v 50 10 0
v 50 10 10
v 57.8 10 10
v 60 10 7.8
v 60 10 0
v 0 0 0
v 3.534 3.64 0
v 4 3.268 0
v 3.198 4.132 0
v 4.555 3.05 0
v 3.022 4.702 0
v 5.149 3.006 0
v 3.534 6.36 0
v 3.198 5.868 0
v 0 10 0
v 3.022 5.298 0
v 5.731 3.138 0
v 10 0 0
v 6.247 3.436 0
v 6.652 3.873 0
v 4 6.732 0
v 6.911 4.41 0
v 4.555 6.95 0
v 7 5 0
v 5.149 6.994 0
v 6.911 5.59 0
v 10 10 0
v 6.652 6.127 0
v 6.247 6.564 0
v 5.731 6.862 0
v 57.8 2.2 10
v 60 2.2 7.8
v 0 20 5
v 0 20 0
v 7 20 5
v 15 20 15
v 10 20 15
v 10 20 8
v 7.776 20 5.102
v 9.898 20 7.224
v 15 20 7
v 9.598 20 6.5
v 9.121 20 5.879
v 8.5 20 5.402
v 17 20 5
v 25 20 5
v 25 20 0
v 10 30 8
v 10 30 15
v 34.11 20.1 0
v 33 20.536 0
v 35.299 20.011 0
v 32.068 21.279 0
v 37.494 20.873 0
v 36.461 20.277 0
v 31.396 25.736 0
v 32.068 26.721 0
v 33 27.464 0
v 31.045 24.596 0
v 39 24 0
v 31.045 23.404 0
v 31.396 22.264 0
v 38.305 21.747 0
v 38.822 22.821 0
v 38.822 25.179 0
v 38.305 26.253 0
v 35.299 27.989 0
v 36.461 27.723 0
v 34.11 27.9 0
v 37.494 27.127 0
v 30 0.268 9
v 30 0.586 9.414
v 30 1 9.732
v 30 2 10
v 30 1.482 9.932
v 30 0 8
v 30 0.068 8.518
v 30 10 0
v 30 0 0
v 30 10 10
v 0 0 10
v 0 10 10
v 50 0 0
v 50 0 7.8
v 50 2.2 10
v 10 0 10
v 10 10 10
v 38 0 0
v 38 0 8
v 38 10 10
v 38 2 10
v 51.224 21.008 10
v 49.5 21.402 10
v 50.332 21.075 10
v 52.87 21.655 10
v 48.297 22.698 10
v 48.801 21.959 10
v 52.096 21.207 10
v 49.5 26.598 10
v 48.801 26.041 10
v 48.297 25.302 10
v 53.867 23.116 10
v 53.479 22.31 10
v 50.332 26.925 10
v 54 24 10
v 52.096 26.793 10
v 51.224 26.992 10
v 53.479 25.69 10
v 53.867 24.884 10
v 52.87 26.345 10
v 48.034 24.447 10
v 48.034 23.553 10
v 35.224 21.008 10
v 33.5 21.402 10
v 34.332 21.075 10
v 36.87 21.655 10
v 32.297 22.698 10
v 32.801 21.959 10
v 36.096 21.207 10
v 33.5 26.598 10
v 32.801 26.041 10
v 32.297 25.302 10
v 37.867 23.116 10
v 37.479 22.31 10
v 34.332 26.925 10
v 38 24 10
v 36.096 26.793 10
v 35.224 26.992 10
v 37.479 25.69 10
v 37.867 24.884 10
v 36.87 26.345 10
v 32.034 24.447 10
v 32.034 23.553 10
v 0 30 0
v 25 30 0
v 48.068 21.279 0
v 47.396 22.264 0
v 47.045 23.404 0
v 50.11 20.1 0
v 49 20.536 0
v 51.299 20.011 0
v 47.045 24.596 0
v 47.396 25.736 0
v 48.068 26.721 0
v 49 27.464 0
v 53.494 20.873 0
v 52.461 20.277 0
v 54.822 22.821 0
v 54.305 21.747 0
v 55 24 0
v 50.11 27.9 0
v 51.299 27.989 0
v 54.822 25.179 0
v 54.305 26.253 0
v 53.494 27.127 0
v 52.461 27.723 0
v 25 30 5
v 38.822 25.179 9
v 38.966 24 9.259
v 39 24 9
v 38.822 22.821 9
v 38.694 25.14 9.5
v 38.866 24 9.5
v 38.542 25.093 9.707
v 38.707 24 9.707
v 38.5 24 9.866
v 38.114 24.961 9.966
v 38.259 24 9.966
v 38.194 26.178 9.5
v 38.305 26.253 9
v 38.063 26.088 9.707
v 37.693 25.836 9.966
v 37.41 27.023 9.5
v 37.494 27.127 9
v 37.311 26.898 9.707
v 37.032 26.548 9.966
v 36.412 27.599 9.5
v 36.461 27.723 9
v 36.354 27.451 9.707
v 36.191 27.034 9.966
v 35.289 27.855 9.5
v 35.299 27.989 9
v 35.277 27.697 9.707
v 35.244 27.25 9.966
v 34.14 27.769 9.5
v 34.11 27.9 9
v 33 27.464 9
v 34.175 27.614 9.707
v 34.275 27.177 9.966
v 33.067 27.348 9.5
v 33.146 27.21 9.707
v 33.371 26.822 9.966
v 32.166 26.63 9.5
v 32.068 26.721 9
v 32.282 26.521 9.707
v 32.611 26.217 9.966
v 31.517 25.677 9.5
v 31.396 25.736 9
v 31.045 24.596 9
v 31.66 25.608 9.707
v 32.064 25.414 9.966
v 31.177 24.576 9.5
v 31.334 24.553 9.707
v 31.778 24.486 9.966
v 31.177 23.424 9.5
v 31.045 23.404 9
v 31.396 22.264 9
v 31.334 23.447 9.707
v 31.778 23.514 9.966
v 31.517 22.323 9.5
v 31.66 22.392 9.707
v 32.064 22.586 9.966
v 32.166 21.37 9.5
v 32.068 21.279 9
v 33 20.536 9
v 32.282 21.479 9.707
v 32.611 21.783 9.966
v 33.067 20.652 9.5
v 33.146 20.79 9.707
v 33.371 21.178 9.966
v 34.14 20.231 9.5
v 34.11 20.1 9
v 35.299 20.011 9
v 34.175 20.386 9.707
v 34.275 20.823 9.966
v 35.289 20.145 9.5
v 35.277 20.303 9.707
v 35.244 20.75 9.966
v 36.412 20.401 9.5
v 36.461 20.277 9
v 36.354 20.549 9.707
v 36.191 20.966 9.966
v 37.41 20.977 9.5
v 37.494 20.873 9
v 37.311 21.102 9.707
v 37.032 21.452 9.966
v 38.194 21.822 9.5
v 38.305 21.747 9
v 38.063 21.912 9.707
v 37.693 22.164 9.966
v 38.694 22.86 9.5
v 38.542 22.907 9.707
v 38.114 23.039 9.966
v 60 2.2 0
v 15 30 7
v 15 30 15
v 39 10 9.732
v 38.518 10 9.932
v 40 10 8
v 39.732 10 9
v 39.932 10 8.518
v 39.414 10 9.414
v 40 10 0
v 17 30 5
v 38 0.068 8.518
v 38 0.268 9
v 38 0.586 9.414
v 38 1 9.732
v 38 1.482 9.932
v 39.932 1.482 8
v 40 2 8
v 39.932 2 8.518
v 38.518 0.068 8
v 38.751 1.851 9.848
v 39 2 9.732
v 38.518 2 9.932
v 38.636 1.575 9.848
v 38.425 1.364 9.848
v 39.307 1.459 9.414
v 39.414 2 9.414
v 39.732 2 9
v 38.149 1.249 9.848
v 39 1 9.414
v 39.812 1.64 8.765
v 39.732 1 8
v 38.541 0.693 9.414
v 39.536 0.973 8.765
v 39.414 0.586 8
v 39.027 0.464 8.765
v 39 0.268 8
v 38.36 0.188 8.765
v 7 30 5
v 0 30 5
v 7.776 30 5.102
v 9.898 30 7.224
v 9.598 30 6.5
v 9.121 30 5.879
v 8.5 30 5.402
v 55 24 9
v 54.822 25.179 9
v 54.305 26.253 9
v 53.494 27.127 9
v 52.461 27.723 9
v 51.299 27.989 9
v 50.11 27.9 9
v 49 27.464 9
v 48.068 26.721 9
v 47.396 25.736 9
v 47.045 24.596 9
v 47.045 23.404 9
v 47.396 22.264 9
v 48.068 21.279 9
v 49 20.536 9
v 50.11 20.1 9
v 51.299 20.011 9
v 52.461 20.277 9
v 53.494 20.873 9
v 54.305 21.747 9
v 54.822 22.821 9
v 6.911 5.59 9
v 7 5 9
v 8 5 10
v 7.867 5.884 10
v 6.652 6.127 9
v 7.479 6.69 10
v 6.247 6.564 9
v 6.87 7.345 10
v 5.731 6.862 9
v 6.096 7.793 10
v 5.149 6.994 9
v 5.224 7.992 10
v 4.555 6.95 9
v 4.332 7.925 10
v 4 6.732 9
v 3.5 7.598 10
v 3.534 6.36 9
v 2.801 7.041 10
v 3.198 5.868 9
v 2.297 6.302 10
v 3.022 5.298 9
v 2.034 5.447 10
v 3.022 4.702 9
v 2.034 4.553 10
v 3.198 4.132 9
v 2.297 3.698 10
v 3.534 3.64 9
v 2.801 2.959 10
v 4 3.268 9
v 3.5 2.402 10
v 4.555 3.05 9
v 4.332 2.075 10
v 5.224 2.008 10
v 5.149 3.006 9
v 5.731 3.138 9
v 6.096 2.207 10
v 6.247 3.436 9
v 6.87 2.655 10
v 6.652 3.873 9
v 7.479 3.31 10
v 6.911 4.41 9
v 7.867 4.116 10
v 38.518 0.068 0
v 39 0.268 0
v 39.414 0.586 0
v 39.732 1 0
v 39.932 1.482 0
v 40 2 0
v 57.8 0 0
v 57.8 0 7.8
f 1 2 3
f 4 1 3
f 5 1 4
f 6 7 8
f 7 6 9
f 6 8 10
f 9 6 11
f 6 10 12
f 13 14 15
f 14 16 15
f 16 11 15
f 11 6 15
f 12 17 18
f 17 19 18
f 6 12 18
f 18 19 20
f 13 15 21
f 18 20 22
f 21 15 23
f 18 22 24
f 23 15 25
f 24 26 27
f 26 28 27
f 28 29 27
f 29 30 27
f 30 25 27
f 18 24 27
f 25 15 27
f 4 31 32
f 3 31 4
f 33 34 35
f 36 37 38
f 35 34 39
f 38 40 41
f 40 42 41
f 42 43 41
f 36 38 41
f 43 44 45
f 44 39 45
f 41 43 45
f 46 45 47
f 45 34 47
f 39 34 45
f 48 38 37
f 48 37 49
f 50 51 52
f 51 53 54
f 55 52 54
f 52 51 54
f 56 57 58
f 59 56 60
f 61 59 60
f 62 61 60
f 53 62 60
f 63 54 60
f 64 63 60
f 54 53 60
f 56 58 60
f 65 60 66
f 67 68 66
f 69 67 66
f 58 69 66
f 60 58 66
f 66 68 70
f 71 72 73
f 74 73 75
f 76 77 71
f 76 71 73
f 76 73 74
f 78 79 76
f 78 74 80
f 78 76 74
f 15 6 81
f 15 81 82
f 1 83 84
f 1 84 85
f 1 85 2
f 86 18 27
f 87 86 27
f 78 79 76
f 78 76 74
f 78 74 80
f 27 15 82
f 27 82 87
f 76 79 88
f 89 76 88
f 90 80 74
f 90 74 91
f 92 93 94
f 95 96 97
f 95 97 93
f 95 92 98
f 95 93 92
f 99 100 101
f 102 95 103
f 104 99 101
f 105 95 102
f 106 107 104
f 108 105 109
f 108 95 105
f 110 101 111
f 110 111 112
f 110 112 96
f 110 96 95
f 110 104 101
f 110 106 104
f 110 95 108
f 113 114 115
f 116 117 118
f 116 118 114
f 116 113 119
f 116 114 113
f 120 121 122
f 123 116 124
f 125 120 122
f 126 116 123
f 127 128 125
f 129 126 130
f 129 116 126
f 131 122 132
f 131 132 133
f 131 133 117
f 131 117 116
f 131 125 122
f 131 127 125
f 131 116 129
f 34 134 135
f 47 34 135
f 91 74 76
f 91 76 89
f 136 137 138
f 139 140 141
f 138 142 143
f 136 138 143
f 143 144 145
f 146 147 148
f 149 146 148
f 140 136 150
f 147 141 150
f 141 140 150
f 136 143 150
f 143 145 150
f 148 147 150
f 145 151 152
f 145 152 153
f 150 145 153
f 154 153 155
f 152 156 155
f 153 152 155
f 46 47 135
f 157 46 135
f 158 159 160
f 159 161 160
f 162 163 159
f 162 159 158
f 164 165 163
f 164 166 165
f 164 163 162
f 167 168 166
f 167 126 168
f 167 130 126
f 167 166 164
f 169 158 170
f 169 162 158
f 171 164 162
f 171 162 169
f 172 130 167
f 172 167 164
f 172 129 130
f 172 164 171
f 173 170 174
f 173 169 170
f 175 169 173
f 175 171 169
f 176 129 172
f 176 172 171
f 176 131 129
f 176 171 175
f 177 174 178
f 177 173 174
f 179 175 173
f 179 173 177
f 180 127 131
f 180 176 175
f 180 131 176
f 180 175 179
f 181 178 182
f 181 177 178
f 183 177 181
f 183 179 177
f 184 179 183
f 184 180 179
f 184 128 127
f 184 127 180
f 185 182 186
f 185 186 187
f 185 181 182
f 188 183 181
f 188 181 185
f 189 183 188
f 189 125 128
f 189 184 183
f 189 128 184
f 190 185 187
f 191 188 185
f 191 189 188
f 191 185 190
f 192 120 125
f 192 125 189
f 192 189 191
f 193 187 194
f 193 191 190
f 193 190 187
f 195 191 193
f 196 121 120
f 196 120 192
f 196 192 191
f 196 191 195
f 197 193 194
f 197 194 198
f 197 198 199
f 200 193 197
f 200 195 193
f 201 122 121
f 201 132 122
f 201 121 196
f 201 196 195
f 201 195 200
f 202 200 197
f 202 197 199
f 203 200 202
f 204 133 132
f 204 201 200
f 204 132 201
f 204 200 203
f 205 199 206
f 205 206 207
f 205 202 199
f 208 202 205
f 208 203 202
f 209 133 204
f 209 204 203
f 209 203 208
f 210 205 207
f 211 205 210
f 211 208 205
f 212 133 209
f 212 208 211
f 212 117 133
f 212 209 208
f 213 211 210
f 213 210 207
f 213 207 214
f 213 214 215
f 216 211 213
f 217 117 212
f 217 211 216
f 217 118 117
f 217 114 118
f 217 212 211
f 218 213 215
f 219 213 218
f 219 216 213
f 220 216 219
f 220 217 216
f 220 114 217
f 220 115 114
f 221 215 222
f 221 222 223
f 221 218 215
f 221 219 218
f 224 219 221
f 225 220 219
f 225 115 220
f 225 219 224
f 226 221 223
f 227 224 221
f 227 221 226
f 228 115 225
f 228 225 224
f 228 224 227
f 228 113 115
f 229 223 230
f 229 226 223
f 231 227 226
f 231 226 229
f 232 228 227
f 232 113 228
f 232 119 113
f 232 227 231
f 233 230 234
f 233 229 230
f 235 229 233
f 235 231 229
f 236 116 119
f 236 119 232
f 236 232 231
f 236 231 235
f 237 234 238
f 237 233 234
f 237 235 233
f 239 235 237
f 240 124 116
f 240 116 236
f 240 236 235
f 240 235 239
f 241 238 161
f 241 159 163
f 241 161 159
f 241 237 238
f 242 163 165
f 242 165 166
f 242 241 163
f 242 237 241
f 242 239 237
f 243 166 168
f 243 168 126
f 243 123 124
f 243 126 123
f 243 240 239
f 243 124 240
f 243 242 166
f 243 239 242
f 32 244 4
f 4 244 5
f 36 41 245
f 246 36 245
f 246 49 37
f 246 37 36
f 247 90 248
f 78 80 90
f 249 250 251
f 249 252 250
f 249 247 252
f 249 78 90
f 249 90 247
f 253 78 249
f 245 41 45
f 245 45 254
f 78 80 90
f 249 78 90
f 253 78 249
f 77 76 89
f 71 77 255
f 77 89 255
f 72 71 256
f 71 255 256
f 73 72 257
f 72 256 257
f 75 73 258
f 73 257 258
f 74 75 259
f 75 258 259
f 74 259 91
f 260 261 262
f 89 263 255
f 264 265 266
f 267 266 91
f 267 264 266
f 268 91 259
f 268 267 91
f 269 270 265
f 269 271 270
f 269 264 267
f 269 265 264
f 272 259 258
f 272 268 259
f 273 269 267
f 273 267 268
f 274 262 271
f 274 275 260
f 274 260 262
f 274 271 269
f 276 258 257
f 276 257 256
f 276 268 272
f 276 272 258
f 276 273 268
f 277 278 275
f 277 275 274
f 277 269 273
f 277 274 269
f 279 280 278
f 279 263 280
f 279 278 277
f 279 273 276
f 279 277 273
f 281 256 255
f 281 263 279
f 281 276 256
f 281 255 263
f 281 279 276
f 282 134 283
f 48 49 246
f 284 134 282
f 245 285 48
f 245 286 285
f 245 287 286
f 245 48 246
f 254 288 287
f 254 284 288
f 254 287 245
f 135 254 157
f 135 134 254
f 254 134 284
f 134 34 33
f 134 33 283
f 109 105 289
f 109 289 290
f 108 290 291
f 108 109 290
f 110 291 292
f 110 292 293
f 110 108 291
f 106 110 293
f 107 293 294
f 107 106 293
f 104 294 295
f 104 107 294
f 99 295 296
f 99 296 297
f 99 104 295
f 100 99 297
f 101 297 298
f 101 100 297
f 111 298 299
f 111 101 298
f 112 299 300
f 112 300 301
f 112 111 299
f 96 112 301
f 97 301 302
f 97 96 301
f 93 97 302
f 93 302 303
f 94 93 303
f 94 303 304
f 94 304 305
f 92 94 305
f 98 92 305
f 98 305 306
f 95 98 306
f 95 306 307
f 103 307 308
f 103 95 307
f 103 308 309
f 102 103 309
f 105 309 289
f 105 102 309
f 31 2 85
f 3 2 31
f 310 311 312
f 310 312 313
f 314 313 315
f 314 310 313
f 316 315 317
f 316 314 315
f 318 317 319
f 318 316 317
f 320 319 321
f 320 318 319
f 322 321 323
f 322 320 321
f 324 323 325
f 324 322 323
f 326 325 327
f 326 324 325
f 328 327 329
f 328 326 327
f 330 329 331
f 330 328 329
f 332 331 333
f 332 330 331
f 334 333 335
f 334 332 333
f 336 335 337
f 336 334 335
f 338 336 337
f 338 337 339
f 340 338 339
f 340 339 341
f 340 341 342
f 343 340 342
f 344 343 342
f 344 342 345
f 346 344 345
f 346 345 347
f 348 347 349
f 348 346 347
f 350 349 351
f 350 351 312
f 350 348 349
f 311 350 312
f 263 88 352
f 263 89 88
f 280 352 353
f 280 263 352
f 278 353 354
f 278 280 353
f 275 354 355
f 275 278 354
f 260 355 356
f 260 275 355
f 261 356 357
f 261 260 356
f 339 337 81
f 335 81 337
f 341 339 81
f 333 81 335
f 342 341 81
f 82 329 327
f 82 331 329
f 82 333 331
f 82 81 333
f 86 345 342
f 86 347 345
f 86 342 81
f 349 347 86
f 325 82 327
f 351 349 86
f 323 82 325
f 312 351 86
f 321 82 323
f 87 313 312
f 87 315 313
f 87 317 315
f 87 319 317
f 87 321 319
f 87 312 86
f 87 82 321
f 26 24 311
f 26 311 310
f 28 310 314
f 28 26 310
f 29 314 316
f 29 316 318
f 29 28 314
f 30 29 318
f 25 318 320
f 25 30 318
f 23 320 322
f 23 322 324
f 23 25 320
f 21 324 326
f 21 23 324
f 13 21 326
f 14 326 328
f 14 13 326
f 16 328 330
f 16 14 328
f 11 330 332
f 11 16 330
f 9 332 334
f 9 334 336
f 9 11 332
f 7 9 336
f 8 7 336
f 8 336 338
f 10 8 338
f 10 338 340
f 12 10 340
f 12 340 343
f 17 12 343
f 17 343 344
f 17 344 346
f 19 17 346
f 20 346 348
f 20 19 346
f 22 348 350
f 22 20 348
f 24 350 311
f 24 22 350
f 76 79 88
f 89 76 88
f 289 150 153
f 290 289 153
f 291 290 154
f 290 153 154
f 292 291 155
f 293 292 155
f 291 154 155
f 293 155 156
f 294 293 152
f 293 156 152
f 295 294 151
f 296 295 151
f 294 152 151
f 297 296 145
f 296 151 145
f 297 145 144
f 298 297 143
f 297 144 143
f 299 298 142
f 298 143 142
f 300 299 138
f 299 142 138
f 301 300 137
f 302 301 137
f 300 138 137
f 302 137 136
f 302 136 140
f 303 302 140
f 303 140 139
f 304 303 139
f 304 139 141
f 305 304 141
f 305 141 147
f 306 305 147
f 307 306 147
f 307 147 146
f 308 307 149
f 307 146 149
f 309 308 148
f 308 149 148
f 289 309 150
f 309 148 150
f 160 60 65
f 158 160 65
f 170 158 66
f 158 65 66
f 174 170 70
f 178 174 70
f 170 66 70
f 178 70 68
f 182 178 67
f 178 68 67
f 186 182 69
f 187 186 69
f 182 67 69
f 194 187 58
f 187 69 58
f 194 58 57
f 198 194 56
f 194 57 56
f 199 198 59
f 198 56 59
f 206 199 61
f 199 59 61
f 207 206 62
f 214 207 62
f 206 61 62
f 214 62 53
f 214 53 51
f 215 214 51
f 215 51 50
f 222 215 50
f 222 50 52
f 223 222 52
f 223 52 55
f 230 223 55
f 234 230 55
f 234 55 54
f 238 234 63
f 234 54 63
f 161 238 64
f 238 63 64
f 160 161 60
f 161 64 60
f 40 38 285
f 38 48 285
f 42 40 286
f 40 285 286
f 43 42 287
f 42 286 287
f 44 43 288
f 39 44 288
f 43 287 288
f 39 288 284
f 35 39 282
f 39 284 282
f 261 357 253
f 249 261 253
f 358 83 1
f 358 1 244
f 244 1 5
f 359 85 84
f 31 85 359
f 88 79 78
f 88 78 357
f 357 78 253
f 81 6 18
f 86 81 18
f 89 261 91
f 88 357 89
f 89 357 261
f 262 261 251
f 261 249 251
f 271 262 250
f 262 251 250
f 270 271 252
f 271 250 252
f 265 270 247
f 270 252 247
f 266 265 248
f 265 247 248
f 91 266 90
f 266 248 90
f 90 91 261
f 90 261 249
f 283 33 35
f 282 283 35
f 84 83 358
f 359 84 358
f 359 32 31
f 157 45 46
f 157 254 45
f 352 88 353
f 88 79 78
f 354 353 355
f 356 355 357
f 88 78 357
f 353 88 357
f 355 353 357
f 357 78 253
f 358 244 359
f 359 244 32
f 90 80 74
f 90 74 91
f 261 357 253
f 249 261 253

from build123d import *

# Parameters (mm, degrees)
CYLINDER_R        = 2
CYLINDER_DEPTH    = 10
BOX_W             = 10
BOX_H             = 10
BOX_DEPTH         = 10
CHAMFER_SIZE      = 1
BOX001_W          = 10
BOX001_H          = 10
BOX001_DEPTH      = 10
CHAMFER001_SIZE   = 2
FILLET_R          = 2
BOX005_W          = 10
BOX005_H          = 10
BOX005_DEPTH      = 10
CHAMFER002_SIZE   = 2.2
CYLINDER002_R     = 4
CYLINDER002_DEPTH = 10
CHAMFER003_SIZE   = 1
CYLINDER001_R     = 4
CYLINDER001_DEPTH = 10
FILLET001_R       = 1
BOX004_W          = 10
BOX004_H          = 10
BOX004_DEPTH      = 10
BOX003_W          = 10
BOX003_H          = 10
BOX003_DEPTH      = 10
BOX002_W          = 25
BOX002_H          = 10
BOX002_DEPTH      = 15
CHAMFER004_SIZE   = 2
FILLET002_R       = 3


with BuildPart() as cylinder:
    # Cylinder → Cylinder (new body)
    with BuildSketch(Plane(origin=(5, 5, 0), x_dir=(1, 0, 0), z_dir=(0, 0, 1))):
        Circle(CYLINDER_R)
    extrude(amount=CYLINDER_DEPTH)


with BuildPart() as chamfer_body:
    # Box → Box (new body)
    with BuildSketch(Plane.XY):
        with Locations((5, 5)):
            Rectangle(BOX_W, BOX_H)
    extrude(amount=BOX_DEPTH)

    # Cut: cut Cylinder
    add(cylinder.part, mode=Mode.SUBTRACT)

    # Chamfer
    chamfer_edges = [chamfer_body.edges().sort_by_distance(p)[0] for p in [
        (3, 5, 10),
    ]]
    chamfer(chamfer_edges, length=CHAMFER_SIZE)


with BuildPart() as cube001:
    # Box001 → Box001 (new body)
    with BuildSketch(Plane(origin=(30, 0, 0), x_dir=(1, 0, 0), z_dir=(0, 0, 1))):
        with Locations((5, 5)):
            Rectangle(BOX001_W, BOX001_H)
    extrude(amount=BOX001_DEPTH)


with BuildPart() as chamfer001:
    # Chamfer001 base: copy of Cube001
    add(cube001.part)

    # Chamfer001
    chamfer001_edges = [chamfer001.edges().sort_by_distance(p)[0] for p in [
        (40, 0, 5),
        (40, 5, 10),
        (35, 0, 10),
    ]]
    chamfer(chamfer001_edges, length=CHAMFER001_SIZE)


with BuildPart() as fillet_body:
    # Fillet base: copy of Cube001
    add(cube001.part)

    # Fillet
    fillet_edges = [fillet_body.edges().sort_by_distance(p)[0] for p in [
        (40, 0, 5),
        (40, 5, 10),
        (35, 0, 10),
    ]]
    fillet(fillet_edges, radius=FILLET_R)


with BuildPart() as chamfer002:
    # Box005 → Box005 (new body)
    with BuildSketch(Plane(origin=(50, 0, 0), x_dir=(1, 0, 0), z_dir=(0, 0, 1))):
        with Locations((5, 5)):
            Rectangle(BOX005_W, BOX005_H)
    extrude(amount=BOX005_DEPTH)

    # Chamfer002
    chamfer002_edges = [chamfer002.edges().sort_by_distance(p)[0] for p in [
        (60, 0, 5),
        (60, 5, 10),
        (55, 0, 10),
    ]]
    chamfer(chamfer002_edges, length=CHAMFER002_SIZE)


with BuildPart() as chamfer003:
    # Cylinder002 → Cylinder002 (new body)
    with BuildSketch(Plane(origin=(51, 24, 0), x_dir=(1, 0, 0), z_dir=(0, 0, 1))):
        Circle(CYLINDER002_R)
    extrude(amount=CYLINDER002_DEPTH)

    # Chamfer003
    chamfer003_edges = [chamfer003.edges().sort_by_distance(p)[0] for p in [
        (47, 24, 10),
    ]]
    chamfer(chamfer003_edges, length=CHAMFER003_SIZE)


with BuildPart() as fillet001:
    # Cylinder001 → Cylinder001 (new body)
    with BuildSketch(Plane(origin=(35, 24, 0), x_dir=(1, 0, 0), z_dir=(0, 0, 1))):
        Circle(CYLINDER001_R)
    extrude(amount=CYLINDER001_DEPTH)

    # Fillet001
    fillet001_edges = [fillet001.edges().sort_by_distance(p)[0] for p in [
        (31, 24, 10),
    ]]
    fillet(fillet001_edges, radius=FILLET001_R)


with BuildPart() as cube004:
    # Box004 → Box004 (new body)
    with BuildSketch(Plane(origin=(0, 20, 5), x_dir=(1, 0, 0), z_dir=(0, 0, 1))):
        with Locations((5, 5)):
            Rectangle(BOX004_W, BOX004_H)
    extrude(amount=BOX004_DEPTH)


with BuildPart() as cube003:
    # Box003 → Box003 (new body)
    with BuildSketch(Plane(origin=(15, 20, 5), x_dir=(1, 0, 0), z_dir=(0, 0, 1))):
        with Locations((5, 5)):
            Rectangle(BOX003_W, BOX003_H)
    extrude(amount=BOX003_DEPTH)


with BuildPart() as fillet002:
    # Box002 → Box002 (new body)
    with BuildSketch(Plane(origin=(0, 20, 0), x_dir=(1, 0, 0), z_dir=(0, 0, 1))):
        with Locations((12.5, 5)):
            Rectangle(BOX002_W, BOX002_H)
    extrude(amount=BOX002_DEPTH)

    # Cut001: cut Cube003
    add(cube003.part, mode=Mode.SUBTRACT)

    # Cut002: cut Cube004
    add(cube004.part, mode=Mode.SUBTRACT)

    # Chamfer004
    chamfer004_edges = [fillet002.edges().sort_by_distance(p)[0] for p in [
        (15, 25, 5),
    ]]
    chamfer(chamfer004_edges, length=CHAMFER004_SIZE)

    # Fillet002
    fillet002_edges = [fillet002.edges().sort_by_distance(p)[0] for p in [
        (10, 25, 5),
    ]]
    fillet(fillet002_edges, radius=FILLET002_R)


solid = Compound([chamfer_body.part, chamfer001.part, fillet_body.part, chamfer002.part, chamfer003.part, fillet001.part, fillet002.part])
